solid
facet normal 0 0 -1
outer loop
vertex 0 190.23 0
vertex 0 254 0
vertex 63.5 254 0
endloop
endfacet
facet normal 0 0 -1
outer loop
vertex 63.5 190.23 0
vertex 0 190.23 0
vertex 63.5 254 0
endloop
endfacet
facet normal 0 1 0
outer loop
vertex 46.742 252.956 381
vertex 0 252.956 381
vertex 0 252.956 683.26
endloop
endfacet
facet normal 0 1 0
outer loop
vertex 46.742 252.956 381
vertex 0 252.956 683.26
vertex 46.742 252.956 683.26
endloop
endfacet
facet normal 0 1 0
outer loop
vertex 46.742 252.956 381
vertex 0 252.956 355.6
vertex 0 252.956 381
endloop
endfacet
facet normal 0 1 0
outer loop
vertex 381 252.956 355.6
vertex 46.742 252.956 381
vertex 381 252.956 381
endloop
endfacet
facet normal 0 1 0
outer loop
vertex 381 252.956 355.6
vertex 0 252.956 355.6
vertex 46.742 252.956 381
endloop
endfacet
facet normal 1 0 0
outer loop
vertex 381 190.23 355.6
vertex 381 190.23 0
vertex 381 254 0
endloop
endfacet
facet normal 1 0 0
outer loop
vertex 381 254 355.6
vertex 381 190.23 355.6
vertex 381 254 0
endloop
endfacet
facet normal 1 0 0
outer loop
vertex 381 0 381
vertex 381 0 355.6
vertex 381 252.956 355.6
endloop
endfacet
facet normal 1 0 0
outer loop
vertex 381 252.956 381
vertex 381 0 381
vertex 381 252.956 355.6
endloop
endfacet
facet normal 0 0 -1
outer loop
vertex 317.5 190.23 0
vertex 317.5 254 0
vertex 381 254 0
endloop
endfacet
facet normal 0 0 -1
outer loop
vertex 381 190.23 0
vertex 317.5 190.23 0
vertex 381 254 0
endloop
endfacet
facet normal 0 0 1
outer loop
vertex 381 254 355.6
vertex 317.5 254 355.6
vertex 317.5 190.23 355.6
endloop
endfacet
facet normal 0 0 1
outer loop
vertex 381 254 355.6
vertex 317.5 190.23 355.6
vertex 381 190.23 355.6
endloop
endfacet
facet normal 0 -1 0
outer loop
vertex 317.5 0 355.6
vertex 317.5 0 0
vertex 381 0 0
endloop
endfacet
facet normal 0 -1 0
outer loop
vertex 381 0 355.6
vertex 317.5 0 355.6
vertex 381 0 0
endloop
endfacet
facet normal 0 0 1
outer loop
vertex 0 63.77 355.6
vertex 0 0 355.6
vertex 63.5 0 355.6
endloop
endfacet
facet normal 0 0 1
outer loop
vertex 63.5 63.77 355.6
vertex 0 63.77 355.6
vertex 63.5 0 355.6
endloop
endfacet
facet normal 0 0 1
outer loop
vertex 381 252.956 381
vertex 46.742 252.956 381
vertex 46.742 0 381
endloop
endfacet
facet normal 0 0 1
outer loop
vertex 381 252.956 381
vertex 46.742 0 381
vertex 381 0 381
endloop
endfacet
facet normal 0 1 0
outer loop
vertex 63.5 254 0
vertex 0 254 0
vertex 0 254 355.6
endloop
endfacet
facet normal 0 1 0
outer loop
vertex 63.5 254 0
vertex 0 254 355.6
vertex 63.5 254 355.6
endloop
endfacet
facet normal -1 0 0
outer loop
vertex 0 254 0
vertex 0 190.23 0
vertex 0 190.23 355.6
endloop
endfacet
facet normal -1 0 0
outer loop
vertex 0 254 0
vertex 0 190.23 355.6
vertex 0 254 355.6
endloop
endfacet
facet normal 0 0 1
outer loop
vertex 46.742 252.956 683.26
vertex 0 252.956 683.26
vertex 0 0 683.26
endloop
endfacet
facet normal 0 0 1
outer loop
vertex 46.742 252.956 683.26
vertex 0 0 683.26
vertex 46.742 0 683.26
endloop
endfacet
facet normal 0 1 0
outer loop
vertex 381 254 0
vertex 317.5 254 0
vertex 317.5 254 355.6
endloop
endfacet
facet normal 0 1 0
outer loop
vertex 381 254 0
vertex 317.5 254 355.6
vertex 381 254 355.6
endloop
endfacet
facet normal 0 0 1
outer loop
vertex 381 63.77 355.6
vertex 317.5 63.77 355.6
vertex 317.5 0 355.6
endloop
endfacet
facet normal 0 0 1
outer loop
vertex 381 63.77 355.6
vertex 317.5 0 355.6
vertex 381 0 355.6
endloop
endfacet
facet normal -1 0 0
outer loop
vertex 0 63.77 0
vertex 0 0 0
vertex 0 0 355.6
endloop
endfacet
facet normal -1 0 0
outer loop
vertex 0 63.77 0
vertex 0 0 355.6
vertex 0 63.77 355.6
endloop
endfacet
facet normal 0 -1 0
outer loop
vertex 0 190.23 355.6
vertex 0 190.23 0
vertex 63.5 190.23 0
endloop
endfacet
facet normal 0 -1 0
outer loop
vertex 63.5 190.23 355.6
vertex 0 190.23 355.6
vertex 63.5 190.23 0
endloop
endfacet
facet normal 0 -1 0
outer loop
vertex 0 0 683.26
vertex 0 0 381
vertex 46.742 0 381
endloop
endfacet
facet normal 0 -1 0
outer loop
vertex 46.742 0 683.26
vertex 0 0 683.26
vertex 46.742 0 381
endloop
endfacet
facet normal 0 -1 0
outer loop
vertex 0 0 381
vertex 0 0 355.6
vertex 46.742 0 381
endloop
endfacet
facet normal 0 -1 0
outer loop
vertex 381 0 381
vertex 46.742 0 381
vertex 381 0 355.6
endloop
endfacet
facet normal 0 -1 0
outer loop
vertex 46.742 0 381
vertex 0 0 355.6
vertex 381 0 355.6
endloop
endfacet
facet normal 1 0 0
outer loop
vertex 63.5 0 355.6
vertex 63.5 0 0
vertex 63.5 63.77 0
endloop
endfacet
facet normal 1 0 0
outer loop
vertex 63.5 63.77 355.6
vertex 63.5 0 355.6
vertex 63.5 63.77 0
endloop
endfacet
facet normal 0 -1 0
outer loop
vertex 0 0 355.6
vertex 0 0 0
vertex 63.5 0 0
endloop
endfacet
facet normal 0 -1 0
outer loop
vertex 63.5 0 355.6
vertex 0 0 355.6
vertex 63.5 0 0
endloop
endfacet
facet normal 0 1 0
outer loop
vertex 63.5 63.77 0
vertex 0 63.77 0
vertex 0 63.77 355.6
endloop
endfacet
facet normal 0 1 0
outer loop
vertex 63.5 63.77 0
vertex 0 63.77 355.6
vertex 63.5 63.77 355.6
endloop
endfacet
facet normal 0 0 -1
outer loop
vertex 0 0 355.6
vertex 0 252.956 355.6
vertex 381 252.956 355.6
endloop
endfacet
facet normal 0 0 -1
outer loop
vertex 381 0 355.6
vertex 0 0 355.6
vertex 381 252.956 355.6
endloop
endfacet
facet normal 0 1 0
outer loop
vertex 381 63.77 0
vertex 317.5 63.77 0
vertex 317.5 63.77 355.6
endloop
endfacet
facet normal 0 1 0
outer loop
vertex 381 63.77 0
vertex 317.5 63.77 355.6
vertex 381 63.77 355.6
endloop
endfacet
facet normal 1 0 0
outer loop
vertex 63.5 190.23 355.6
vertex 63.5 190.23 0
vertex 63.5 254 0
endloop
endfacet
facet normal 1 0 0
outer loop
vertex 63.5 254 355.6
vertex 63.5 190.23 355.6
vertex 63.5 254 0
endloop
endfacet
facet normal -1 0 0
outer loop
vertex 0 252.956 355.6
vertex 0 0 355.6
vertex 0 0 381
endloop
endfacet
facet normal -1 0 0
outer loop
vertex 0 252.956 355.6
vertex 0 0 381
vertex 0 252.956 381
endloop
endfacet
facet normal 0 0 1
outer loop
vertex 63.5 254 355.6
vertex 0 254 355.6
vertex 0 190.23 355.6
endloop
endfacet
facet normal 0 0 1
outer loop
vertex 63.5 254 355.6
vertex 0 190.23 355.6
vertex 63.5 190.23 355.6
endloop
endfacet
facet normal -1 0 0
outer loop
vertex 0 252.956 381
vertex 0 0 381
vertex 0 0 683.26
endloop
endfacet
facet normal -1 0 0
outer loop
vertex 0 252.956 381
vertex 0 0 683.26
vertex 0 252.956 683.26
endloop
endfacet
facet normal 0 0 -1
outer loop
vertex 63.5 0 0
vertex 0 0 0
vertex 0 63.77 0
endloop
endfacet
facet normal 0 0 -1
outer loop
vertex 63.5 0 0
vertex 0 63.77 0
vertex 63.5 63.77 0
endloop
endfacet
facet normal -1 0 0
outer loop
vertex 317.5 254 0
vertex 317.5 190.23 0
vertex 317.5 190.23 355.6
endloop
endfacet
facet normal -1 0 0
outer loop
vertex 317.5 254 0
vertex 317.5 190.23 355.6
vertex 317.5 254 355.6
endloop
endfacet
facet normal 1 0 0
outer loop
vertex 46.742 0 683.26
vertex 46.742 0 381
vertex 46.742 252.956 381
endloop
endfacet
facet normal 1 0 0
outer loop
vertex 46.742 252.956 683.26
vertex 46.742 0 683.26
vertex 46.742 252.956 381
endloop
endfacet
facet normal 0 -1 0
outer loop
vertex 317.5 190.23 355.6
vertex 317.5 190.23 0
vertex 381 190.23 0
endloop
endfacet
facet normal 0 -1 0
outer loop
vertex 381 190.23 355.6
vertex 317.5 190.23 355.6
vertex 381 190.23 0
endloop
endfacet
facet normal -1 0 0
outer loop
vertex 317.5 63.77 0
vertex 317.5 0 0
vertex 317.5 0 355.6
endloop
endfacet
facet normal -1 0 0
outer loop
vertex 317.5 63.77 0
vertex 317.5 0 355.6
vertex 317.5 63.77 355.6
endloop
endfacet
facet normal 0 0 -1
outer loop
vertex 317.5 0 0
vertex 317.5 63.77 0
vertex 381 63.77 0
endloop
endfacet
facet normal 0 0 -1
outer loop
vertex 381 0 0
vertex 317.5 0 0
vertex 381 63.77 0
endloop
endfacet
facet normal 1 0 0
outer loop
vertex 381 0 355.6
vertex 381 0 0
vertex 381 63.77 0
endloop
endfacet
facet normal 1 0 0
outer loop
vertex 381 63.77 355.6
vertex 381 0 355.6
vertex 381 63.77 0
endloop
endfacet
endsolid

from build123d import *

# Parameters (mm, degrees)
F0_W     = 63.5
F0_H     = 63.770218
F1_DEPTH = 355.6
F2_W     = 381
F2_H     = 252.955556
F3_DEPTH = 25.4
F4_W     = 46.742029
F4_H     = 252.955556
F5_DEPTH = 302.26


with BuildPart() as f1:
    # F0 (on Top) → F1 (new body)
    with BuildSketch(Plane.XY):
        with Locations((349.25, 31.885109)):
            Rectangle(F0_W, F0_H)
        with Locations((31.75, 31.885109)):
            Rectangle(F0_W, F0_H)
        with Locations((31.75, 222.114891)):
            Rectangle(F0_W, F0_H)
        with Locations((349.25, 222.114891)):
            Rectangle(F0_W, F0_H)
    extrude(amount=F1_DEPTH)


with BuildPart() as f3:
    # F2 (on face) → F3 (new body)
    with BuildSketch(Plane.XY.offset(355.6)):
        with Locations((190.5, 126.477778)):
            Rectangle(F2_W, F2_H)
    extrude(amount=F3_DEPTH)

    # F4 (on face) → F5 (join)
    with BuildSketch(Plane.XY.offset(381)):
        with Locations((23.371014, 126.477778)):
            Rectangle(F4_W, F4_H)
    extrude(amount=F5_DEPTH)


solid = Compound([f1.part, f3.part])
